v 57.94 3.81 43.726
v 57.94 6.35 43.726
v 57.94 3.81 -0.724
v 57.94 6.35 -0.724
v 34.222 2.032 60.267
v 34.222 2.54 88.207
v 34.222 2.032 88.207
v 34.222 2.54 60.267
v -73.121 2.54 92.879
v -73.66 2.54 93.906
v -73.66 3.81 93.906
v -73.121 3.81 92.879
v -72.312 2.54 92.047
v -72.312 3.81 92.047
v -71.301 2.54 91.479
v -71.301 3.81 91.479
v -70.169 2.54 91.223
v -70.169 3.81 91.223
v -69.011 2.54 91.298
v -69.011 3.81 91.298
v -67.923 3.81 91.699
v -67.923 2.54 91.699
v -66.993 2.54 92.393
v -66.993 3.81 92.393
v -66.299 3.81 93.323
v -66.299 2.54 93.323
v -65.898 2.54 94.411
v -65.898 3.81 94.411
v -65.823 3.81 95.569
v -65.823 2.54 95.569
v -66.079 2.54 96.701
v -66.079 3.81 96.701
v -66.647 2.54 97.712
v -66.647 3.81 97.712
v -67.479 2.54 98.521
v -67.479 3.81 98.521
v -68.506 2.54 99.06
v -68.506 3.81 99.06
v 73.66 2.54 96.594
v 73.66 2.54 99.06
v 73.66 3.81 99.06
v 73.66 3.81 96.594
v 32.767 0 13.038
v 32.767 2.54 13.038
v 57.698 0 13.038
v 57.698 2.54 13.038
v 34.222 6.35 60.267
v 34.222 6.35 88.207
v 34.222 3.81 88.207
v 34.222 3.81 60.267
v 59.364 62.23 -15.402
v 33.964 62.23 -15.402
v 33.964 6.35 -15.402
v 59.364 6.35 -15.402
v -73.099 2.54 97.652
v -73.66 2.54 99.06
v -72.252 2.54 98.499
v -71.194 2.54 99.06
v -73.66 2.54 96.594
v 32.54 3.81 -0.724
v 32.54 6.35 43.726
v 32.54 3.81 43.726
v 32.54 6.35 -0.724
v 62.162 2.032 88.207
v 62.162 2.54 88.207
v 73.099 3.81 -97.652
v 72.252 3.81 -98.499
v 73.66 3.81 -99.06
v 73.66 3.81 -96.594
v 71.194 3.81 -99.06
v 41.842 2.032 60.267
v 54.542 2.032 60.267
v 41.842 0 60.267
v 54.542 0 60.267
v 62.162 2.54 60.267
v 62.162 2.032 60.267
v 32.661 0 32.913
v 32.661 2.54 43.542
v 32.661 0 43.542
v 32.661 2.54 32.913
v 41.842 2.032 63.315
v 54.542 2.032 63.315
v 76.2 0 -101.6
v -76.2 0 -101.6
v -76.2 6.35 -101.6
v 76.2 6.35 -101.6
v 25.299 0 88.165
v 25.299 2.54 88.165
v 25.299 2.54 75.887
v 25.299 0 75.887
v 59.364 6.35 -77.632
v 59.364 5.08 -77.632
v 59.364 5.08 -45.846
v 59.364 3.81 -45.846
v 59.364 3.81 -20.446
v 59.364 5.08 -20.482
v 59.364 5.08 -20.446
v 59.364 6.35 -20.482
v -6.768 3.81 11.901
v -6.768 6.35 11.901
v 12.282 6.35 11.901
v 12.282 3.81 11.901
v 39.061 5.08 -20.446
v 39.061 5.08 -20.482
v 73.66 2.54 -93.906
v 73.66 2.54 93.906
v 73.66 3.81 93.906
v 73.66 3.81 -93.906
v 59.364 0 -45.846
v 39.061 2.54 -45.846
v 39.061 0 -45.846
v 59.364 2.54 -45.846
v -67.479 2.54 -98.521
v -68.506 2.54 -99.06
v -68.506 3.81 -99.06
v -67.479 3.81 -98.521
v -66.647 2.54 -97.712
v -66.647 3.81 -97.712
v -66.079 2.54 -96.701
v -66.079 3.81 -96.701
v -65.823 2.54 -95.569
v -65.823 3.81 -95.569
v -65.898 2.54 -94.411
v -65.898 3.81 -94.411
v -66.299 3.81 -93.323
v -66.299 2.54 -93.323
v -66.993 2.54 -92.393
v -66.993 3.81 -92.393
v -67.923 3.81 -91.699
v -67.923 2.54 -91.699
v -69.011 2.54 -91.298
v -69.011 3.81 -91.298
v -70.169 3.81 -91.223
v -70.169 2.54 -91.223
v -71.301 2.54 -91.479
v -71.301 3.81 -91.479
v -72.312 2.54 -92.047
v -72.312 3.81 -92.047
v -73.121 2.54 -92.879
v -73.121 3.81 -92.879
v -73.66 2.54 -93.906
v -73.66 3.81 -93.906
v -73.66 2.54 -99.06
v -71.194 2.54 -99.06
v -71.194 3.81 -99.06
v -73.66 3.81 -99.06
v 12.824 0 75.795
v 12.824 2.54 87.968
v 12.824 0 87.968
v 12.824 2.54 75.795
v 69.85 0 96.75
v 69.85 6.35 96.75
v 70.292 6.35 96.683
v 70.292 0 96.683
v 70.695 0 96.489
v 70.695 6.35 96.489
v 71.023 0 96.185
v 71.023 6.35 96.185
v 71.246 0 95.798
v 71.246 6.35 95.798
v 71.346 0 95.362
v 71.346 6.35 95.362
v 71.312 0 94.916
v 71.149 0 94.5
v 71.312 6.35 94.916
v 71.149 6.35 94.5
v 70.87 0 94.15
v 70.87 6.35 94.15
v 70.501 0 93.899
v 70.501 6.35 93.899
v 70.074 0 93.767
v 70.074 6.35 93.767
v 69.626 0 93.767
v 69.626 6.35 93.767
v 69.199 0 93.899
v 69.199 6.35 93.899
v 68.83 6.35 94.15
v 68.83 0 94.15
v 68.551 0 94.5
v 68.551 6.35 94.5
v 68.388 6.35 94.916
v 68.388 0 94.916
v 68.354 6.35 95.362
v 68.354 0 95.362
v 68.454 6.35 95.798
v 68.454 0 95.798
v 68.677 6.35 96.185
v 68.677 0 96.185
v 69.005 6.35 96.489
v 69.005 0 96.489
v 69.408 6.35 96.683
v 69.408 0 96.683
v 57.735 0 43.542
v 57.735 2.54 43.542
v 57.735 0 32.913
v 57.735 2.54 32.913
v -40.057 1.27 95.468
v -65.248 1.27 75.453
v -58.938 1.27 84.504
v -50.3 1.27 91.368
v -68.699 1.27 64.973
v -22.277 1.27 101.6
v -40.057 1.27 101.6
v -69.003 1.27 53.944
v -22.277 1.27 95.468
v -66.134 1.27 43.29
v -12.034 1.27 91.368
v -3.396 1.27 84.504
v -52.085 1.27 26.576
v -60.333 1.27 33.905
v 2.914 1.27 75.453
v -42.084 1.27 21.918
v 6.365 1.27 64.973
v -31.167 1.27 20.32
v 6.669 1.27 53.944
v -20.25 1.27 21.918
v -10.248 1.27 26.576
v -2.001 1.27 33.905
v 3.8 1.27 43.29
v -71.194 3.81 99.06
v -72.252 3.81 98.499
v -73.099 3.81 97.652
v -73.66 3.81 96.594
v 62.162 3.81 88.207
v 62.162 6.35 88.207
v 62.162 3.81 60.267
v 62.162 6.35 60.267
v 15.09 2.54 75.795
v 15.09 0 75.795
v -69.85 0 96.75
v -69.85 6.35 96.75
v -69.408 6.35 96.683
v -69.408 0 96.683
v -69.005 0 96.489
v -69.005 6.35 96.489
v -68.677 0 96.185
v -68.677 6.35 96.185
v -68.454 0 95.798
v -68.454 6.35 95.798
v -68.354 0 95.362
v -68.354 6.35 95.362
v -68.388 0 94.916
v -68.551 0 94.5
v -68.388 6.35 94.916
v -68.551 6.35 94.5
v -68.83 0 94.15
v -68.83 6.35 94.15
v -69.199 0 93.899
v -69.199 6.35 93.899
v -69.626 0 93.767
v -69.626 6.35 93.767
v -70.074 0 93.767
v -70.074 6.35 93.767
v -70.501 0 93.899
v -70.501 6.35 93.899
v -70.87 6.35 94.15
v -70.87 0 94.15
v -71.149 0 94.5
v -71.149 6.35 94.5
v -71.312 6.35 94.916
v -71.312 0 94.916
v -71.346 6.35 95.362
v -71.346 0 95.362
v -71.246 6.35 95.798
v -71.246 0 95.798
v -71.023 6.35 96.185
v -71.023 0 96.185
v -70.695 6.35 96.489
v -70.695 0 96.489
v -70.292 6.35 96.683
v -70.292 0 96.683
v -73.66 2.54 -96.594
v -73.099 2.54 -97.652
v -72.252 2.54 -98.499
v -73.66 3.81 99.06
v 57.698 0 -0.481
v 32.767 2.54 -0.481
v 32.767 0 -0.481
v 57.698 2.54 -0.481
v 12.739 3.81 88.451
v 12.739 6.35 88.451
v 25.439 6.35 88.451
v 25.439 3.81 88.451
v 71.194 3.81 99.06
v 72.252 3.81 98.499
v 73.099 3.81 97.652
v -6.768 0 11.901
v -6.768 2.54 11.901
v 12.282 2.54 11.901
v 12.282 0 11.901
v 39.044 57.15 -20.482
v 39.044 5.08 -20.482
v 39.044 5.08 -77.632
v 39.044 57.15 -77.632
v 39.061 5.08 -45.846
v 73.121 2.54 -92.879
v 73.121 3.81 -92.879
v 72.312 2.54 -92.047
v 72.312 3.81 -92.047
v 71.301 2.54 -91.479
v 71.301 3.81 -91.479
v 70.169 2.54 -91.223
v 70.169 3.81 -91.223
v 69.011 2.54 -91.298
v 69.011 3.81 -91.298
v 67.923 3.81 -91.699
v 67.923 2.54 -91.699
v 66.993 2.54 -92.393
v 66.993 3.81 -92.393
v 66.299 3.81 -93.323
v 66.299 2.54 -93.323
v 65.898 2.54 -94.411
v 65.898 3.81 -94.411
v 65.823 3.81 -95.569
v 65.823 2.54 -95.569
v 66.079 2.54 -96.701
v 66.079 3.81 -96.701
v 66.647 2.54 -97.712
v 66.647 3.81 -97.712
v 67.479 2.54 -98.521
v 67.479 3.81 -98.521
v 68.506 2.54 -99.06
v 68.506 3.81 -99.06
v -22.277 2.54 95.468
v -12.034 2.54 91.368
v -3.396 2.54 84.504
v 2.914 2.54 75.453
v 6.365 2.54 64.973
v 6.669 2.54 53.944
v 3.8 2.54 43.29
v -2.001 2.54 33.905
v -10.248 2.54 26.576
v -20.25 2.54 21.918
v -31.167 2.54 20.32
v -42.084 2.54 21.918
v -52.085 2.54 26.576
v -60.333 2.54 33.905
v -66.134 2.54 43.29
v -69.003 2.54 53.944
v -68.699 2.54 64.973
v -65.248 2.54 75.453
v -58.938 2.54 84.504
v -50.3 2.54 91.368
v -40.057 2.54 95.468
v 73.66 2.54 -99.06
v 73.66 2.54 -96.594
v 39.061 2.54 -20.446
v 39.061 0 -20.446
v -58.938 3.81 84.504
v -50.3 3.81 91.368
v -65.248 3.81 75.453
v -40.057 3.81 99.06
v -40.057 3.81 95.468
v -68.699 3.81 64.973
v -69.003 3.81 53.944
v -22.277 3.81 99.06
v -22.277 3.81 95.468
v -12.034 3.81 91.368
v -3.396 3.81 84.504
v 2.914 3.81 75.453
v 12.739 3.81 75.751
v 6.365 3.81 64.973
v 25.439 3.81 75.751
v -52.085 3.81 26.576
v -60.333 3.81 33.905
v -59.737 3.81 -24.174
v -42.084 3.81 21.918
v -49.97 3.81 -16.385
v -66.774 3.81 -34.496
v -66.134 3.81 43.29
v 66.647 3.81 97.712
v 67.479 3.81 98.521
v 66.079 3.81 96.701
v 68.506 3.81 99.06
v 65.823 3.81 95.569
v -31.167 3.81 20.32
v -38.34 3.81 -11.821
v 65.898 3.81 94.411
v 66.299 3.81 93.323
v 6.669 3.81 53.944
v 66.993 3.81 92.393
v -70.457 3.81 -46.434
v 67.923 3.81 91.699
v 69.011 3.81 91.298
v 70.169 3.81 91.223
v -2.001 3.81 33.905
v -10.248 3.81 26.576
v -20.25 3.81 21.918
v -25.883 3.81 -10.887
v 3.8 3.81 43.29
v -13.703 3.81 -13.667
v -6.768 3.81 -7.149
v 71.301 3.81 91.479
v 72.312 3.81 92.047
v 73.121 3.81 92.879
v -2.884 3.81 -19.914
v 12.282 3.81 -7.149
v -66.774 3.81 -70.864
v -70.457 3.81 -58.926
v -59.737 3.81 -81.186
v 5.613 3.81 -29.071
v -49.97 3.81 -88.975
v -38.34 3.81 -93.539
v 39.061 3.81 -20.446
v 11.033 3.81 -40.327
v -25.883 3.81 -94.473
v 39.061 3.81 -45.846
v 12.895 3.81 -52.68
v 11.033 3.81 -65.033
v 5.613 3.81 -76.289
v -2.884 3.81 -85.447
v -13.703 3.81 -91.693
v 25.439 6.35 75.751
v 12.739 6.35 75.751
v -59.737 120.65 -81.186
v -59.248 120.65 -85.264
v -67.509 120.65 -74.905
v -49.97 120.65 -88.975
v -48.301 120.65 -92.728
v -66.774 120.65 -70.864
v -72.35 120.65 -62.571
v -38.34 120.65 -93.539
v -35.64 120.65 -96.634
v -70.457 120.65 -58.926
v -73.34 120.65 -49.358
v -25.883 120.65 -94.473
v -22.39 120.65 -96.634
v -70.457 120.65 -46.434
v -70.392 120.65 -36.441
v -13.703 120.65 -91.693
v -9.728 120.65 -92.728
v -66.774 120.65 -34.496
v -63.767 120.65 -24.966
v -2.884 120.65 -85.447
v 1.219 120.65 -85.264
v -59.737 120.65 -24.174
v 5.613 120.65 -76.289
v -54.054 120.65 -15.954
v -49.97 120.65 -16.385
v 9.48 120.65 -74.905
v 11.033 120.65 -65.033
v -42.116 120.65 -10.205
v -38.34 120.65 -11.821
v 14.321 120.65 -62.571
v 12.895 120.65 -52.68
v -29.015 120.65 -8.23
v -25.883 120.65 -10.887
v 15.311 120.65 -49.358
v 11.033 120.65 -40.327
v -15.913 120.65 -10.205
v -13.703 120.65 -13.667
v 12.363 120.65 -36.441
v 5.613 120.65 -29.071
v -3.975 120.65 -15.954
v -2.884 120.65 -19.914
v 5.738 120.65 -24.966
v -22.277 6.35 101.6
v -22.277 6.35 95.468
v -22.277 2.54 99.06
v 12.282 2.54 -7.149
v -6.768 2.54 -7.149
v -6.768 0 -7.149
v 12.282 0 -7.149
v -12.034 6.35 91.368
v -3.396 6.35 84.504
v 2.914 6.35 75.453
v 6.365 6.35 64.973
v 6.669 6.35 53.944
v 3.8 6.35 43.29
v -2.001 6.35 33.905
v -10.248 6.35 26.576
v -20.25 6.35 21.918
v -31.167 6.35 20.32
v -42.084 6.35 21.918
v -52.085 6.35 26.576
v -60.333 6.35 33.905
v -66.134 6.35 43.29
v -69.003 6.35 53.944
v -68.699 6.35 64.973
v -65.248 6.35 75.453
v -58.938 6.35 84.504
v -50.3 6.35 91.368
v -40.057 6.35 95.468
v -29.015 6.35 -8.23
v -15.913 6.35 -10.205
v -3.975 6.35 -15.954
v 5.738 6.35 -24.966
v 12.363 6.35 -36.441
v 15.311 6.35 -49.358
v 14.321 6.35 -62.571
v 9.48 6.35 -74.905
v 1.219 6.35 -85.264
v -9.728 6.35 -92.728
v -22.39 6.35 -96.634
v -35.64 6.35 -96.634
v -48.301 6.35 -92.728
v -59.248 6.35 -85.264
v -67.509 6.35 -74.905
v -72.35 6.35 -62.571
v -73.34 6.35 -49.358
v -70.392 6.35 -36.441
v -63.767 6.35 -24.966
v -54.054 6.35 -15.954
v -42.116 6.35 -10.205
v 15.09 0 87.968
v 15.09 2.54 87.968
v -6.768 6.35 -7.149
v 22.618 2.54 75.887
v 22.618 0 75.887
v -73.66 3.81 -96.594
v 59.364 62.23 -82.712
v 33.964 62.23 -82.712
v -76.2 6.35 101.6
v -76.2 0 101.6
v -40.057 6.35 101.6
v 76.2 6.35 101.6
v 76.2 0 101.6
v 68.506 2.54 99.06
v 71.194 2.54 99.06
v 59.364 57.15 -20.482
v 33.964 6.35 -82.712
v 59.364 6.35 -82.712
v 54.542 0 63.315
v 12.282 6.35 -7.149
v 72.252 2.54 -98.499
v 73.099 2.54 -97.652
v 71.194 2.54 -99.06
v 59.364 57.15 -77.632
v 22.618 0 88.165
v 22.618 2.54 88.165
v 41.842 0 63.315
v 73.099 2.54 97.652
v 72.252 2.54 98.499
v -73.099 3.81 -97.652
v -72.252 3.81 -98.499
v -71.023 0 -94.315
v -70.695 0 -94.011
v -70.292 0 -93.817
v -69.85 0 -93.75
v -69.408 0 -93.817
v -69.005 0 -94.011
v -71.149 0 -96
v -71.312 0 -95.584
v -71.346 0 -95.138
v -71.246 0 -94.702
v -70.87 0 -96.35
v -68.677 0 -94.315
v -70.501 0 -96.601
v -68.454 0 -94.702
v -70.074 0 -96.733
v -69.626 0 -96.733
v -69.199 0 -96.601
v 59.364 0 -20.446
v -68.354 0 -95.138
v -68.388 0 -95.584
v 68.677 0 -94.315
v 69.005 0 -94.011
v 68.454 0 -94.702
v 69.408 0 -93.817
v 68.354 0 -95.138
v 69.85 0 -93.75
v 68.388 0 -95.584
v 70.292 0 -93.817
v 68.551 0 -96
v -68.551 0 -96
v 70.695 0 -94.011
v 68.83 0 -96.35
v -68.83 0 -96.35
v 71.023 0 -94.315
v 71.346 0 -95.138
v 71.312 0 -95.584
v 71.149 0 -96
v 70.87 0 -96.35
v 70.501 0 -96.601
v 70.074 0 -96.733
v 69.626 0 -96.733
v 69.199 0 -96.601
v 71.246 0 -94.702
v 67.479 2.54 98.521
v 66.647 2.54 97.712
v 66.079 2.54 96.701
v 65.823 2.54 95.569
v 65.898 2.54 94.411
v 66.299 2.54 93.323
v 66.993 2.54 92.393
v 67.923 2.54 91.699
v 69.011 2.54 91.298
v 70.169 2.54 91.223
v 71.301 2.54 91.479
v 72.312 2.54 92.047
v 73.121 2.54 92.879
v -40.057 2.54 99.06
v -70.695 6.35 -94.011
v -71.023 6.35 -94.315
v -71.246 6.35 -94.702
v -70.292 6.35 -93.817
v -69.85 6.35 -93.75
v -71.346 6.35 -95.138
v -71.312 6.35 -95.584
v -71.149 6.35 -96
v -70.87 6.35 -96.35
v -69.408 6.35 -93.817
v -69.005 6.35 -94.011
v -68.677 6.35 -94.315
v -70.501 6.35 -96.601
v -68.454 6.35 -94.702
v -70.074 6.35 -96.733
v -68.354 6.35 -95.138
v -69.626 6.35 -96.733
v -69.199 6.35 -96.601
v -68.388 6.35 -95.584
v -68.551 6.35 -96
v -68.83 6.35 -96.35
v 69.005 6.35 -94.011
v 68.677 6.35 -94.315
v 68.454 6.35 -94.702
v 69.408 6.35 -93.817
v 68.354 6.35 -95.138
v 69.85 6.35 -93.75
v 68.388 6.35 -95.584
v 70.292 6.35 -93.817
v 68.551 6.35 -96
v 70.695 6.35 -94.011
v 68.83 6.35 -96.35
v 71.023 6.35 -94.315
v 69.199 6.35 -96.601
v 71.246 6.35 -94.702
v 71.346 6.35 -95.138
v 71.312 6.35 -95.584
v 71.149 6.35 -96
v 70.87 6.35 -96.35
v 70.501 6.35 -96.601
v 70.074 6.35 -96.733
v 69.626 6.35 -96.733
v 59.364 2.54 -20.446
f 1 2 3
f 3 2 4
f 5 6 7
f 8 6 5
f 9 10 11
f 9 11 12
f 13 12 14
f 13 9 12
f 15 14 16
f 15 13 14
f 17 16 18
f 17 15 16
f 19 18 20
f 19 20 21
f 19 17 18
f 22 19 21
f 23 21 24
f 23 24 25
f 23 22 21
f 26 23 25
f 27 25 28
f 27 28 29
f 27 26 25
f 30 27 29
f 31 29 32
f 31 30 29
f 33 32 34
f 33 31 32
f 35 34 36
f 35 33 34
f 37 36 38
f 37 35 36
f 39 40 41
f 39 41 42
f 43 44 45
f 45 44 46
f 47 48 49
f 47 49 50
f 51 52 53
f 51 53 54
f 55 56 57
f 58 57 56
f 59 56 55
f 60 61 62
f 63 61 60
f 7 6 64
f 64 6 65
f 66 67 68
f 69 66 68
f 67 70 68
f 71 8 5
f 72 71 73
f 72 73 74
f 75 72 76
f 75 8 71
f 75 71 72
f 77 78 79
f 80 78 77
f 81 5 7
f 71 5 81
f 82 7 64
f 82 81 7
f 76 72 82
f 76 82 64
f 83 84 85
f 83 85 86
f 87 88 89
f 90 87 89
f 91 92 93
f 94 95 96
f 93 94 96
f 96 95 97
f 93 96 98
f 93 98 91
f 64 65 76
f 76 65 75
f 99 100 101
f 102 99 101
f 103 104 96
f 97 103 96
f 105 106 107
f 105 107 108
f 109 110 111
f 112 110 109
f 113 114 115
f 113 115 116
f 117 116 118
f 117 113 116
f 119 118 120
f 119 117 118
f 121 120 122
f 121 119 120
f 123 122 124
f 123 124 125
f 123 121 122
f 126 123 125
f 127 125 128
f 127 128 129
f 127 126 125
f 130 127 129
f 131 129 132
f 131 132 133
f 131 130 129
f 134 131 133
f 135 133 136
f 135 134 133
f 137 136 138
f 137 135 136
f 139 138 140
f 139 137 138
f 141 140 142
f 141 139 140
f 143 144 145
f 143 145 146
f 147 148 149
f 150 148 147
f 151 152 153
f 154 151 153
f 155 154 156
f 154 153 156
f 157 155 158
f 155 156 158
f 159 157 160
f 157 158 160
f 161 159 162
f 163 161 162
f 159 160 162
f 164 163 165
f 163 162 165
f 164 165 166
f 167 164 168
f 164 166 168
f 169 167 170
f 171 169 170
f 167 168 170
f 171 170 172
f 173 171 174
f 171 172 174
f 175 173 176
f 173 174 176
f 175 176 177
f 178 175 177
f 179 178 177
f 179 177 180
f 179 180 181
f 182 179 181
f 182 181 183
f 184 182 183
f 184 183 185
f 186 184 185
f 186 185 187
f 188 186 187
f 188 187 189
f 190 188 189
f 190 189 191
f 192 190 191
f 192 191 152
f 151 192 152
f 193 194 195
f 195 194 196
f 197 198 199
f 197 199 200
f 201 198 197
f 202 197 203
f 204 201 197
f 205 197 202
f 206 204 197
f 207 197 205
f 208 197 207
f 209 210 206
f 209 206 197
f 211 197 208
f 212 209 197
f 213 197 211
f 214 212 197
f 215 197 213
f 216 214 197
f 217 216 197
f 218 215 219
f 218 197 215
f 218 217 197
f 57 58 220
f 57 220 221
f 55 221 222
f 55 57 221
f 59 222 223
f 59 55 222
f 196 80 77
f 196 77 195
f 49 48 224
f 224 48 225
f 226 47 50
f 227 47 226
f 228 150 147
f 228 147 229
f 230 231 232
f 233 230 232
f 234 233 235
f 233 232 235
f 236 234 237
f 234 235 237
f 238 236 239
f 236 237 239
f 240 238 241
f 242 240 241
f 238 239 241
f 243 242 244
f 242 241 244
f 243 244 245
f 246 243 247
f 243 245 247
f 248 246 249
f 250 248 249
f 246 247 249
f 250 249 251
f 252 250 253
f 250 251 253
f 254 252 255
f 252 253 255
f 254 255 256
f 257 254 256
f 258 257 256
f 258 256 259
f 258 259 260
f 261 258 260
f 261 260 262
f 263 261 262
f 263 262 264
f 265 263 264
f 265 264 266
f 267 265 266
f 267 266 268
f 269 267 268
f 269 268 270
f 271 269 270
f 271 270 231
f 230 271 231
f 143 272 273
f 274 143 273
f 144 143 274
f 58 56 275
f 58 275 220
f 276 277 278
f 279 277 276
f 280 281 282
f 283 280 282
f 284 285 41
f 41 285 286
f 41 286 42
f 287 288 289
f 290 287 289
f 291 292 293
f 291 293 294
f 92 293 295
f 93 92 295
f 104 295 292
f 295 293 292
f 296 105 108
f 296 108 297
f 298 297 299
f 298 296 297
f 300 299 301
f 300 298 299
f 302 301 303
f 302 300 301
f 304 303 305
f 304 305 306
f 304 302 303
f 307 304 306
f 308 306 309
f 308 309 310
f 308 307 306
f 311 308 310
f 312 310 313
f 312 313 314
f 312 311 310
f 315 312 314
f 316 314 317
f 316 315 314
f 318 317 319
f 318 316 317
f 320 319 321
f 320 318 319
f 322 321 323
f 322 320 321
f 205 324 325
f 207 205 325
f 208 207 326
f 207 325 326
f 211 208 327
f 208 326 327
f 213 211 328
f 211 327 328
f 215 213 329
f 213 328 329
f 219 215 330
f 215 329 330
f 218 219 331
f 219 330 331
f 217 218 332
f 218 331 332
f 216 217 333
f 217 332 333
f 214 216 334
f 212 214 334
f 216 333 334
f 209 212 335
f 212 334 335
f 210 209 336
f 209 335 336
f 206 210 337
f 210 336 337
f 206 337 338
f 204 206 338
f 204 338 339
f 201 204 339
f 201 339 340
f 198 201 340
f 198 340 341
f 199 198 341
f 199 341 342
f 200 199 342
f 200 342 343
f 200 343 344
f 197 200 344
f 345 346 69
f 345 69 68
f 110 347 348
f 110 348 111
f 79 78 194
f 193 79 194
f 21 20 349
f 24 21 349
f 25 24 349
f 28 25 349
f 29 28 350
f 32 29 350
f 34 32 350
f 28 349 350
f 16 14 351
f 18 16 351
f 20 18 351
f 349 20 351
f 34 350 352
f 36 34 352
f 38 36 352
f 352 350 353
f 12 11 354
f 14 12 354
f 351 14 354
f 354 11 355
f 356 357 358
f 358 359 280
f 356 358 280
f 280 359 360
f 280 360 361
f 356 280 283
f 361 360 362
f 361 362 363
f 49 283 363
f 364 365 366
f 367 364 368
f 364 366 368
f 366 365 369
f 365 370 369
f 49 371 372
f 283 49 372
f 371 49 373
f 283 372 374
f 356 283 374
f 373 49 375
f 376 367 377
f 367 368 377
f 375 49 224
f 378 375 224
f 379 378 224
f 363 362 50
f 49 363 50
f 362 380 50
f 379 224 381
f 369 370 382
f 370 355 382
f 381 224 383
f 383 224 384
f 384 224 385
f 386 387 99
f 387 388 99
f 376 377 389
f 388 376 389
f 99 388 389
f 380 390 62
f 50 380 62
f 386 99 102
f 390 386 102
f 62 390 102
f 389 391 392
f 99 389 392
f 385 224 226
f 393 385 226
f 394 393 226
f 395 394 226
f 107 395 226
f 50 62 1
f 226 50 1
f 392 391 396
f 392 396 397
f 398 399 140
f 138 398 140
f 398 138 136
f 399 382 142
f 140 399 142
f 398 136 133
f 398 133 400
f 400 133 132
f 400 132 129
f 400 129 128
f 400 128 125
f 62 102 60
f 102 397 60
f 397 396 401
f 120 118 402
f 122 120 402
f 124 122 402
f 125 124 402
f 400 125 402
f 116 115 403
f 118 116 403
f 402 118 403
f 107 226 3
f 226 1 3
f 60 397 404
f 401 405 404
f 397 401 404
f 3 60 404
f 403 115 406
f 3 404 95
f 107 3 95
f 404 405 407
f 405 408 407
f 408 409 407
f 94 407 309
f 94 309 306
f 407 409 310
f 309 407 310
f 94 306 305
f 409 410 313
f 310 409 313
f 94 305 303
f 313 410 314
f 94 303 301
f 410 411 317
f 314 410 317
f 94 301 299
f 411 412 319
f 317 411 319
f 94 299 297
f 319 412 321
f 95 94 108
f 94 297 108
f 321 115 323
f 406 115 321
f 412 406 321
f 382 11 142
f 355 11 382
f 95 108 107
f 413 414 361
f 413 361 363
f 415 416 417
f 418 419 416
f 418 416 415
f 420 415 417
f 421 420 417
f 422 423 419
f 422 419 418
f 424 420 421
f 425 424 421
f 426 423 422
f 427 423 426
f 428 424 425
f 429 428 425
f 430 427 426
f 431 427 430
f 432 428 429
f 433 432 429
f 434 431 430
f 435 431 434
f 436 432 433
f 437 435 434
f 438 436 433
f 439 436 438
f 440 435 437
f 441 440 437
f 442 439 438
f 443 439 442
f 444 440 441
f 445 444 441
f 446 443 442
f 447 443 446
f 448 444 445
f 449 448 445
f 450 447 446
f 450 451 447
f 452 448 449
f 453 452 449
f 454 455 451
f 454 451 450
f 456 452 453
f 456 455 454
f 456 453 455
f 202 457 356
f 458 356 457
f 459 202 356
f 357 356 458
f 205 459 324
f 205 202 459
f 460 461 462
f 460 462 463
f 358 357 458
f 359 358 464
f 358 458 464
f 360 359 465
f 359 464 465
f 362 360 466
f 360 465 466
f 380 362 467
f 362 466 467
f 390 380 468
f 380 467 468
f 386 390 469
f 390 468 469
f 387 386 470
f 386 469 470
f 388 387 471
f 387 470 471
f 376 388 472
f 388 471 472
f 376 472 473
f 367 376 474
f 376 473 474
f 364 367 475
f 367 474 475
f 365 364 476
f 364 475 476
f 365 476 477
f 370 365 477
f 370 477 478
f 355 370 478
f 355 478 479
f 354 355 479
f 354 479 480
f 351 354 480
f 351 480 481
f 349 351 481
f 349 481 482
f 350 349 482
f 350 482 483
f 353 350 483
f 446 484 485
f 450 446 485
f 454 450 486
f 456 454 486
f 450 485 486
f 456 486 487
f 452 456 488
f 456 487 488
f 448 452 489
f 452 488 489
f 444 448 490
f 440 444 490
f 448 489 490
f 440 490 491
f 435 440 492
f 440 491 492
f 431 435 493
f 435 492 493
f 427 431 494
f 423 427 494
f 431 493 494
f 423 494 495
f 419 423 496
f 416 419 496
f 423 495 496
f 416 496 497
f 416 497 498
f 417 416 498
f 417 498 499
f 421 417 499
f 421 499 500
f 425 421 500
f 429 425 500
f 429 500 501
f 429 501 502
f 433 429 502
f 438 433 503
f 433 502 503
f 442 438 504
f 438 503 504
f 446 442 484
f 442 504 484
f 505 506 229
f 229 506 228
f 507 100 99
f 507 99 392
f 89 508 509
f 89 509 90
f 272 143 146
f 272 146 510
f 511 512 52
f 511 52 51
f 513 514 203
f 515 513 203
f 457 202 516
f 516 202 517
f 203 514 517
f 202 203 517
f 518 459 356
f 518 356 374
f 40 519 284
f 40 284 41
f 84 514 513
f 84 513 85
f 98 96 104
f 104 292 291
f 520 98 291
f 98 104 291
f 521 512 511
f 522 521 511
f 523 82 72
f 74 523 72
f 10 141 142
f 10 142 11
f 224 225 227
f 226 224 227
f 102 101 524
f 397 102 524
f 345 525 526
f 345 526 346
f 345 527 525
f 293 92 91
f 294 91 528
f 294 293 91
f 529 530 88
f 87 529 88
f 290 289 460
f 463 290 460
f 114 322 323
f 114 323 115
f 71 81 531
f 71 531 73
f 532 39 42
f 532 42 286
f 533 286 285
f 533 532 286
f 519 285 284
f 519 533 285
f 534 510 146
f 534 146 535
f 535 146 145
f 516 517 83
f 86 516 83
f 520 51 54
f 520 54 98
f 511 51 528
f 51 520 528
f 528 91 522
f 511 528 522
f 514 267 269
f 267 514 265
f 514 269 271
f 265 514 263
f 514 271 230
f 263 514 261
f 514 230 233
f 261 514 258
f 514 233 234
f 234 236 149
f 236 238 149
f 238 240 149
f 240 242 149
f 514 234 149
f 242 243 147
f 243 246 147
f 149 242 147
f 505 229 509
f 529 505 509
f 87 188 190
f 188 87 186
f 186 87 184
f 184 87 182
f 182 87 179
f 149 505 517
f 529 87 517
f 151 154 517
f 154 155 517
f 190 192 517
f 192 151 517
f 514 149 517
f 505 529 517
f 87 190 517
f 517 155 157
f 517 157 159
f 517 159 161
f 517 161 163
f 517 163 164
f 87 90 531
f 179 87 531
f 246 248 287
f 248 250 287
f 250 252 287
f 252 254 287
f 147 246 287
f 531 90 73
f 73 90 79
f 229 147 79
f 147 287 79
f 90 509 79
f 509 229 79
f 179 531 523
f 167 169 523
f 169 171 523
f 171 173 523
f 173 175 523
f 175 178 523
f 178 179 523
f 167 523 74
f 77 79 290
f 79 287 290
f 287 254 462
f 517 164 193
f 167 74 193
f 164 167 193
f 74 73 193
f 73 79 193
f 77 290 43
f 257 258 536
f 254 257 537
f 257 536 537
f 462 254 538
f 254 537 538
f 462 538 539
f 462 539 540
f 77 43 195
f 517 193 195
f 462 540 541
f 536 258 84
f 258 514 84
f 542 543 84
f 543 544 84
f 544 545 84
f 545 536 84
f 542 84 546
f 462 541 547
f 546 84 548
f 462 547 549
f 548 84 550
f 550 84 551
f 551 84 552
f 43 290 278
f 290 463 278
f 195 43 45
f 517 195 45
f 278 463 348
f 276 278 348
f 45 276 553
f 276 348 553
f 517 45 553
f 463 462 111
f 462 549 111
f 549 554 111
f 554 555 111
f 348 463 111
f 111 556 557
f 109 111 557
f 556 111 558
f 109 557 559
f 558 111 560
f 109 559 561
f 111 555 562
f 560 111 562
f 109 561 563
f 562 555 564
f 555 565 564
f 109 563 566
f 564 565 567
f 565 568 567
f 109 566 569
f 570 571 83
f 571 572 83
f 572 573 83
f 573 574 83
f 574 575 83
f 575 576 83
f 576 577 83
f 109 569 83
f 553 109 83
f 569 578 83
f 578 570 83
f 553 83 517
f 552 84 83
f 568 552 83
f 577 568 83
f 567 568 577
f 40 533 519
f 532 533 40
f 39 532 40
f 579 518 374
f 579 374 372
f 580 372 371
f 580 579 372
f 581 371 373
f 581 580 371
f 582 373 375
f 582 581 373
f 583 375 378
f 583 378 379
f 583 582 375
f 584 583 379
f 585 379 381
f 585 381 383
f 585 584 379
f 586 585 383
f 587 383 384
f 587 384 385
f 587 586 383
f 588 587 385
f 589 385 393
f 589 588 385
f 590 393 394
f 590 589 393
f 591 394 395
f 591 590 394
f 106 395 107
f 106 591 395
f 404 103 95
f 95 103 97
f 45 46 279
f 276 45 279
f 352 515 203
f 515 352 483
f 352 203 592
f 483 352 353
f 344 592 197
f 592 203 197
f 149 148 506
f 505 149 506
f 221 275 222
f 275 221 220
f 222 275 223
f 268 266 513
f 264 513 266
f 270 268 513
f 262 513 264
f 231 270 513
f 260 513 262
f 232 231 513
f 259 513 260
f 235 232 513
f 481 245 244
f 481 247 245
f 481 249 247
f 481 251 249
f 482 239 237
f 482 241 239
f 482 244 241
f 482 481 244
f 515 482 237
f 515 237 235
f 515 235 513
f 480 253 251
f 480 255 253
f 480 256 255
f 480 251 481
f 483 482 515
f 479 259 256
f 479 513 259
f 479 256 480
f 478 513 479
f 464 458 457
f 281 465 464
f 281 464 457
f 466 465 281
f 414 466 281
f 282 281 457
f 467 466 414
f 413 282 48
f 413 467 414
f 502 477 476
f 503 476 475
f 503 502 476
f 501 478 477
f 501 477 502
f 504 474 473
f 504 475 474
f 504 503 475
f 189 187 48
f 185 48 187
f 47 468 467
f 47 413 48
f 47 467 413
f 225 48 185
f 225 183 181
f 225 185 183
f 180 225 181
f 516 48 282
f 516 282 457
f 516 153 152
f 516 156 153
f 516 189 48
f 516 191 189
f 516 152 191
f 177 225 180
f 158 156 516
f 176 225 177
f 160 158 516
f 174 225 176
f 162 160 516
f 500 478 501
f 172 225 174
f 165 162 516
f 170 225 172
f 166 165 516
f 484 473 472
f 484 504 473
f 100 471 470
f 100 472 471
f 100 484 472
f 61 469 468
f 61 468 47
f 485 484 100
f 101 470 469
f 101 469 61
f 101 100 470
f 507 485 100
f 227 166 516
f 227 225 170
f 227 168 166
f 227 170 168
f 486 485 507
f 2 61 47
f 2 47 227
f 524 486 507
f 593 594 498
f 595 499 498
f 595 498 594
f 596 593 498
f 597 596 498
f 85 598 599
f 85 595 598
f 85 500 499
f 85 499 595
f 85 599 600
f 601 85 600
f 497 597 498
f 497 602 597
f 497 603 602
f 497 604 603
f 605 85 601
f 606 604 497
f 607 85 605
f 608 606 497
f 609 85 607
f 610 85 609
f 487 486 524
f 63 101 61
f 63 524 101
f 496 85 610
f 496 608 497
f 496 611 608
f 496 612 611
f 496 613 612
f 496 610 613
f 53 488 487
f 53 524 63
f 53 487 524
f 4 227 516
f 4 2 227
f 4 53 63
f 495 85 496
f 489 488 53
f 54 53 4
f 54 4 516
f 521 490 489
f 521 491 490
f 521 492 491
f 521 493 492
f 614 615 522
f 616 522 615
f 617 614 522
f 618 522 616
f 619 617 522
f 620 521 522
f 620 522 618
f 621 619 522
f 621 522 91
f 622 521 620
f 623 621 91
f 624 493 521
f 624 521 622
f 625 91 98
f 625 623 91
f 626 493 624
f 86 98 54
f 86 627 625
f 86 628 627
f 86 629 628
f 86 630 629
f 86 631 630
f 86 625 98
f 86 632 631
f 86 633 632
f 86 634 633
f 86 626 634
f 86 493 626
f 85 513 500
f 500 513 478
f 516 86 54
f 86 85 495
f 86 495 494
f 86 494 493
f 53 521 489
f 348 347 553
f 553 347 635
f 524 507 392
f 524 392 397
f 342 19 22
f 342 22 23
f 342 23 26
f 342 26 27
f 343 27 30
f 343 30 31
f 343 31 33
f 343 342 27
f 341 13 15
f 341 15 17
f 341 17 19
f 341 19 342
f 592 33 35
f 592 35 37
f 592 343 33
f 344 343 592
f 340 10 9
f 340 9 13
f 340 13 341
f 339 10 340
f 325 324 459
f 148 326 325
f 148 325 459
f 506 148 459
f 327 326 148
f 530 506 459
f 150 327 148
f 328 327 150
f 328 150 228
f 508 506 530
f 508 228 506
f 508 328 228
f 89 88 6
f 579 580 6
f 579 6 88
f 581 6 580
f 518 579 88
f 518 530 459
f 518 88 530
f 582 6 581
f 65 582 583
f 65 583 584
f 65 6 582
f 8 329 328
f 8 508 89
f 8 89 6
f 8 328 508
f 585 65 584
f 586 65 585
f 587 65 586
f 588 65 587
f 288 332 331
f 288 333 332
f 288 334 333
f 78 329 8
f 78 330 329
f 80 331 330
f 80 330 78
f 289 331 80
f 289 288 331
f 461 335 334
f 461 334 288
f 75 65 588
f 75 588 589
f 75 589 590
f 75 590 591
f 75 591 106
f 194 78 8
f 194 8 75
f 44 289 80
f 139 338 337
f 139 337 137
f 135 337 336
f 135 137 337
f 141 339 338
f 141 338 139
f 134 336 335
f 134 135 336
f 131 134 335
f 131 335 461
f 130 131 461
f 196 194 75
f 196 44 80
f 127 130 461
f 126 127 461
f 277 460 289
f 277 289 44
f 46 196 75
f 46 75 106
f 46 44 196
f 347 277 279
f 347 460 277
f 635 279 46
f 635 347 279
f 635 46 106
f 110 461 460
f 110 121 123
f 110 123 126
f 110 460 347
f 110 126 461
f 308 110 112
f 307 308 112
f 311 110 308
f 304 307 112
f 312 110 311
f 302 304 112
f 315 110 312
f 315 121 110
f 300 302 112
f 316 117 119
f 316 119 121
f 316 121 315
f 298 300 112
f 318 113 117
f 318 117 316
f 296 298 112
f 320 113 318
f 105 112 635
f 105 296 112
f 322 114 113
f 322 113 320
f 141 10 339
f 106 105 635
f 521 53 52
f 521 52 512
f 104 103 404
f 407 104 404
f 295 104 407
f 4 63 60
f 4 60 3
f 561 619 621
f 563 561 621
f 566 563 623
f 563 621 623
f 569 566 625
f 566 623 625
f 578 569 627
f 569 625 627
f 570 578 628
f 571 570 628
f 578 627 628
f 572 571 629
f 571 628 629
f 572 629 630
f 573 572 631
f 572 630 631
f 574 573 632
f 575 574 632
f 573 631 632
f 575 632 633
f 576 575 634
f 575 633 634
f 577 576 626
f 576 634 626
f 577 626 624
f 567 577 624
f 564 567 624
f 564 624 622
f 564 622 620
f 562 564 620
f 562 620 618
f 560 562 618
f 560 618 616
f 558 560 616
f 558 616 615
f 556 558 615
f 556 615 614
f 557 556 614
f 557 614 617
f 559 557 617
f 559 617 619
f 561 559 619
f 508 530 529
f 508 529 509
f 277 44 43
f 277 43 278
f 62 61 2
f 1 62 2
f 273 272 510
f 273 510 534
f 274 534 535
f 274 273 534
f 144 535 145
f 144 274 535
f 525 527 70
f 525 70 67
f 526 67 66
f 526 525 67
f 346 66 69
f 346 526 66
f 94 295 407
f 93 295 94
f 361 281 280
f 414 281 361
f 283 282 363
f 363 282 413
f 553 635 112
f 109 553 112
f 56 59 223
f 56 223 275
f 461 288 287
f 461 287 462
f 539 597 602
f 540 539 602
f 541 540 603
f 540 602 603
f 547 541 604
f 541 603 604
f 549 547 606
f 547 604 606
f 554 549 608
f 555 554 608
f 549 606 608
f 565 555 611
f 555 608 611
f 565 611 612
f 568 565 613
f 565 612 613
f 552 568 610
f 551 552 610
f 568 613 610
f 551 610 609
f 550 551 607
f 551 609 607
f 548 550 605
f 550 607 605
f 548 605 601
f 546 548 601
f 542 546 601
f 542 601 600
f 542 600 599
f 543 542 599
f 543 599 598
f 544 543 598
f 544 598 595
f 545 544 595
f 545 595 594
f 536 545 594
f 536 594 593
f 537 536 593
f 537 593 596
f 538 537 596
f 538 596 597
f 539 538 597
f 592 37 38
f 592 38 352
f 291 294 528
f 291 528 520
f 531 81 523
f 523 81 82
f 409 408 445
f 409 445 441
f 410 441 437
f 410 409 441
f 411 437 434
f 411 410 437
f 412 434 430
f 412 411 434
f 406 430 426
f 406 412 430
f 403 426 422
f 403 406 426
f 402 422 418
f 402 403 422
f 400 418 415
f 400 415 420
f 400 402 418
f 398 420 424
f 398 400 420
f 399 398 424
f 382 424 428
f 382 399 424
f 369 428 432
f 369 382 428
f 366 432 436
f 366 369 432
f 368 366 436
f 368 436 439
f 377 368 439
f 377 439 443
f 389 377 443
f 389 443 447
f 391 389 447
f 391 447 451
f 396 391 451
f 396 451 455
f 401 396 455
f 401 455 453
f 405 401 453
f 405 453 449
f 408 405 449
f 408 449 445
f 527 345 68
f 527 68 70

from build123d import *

# Parameters (mm, degrees)
SKETCH1_W           = 152.4
SKETCH1_H           = 203.2
BOSS_EXTRUDE2_DEPTH = 6.35
SKETCH2_R           = 1.5
CUT_EXTRUDE1_DEPTH  = 128.158650905
SKETCH3_R           = 1.5
CUT_EXTRUDE2_DEPTH  = 128.158650905
SKETCH4_R           = 1.5
CUT_EXTRUDE3_DEPTH  = 128.158650905
SKETCH5_R           = 44.45
BOSS_EXTRUDE3_DEPTH = 114.3
SHELL1_START        = 2.54
SHELL1_OUTLINE_R    = 41.91
SHELL1_DEPTH        = 118.11
SHELL1_2_OUTLINE_R  = 41.91
SHELL1_2_DEPTH      = 1.27
SKETCH6_R           = 38.1
CUT_EXTRUDE4_DEPTH  = 5.08
SKETCH7_W           = 17.78
SKETCH7_H           = 18.673076246
CUT_EXTRUDE5_DEPTH  = 5.08
SKETCH8_W           = 19.05
SKETCH8_H           = 19.05
CUT_EXTRUDE6_DEPTH  = 171.861025398
SKETCH9_W           = 27.94
SKETCH9_H           = 27.94
CUT_EXTRUDE7_DEPTH  = 4.318
SKETCH10_W          = 12.7
SKETCH10_H          = 3.048
CUT_EXTRUDE9_DEPTH  = 174.779256311
SKETCH12_W          = 25.4
SKETCH12_H          = 67.31
BOSS_EXTRUDE5_DEPTH = 55.88
SHELL3_START        = 39.044015943
SHELL3_OUTLINE_W    = 52.07
SHELL3_OUTLINE_H    = 57.15
SHELL3_DEPTH        = 20.32
SKETCH13_W          = 20.303180985
SKETCH13_H          = 25.4
CUT_EXTRUDE10_DEPTH = 55.88
SKETCH17_W          = 25.4
SKETCH17_H          = 44.45
CUT_EXTRUDE11_DEPTH = 3.048
SKETCH18_W          = 24.931380967
SKETCH18_H          = 13.519409137
CUT_EXTRUDE12_DEPTH = 10.668
SKETCH19_W          = 25.074639176
SKETCH19_H          = 10.629198189
CUT_EXTRUDE13_DEPTH = 10.668
SKETCH20_W          = 12.7
SKETCH20_H          = 12.7
CUT_EXTRUDE14_DEPTH = 3.048
SKETCH22_W          = 2.266473324
SKETCH22_H          = 12.172894029
CUT_EXTRUDE15_DEPTH = 5.08
SKETCH23_W          = 2.681145579
SKETCH23_H          = 12.278390502
CUT_EXTRUDE16_DEPTH = 5.08


# Read off the part's stored shape, not the designer's step: Shell1, Shell3
with BuildPart() as part:
    # Sketch1 → Boss-Extrude2 (new body)
    with BuildSketch(Plane(origin=(0, 0, 0), x_dir=(1, 0, 0), z_dir=(0, 1, 0))):
        Rectangle(SKETCH1_W, SKETCH1_H)
    extrude(amount=BOSS_EXTRUDE2_DEPTH)

    # Sketch2 → Cut-Extrude1 (cut, through all)
    with BuildSketch(Plane(origin=(0, 6.35, 0), x_dir=(1, 0, 0), z_dir=(0, 1, 0))):
        with Locations(Location((-69.85, 95.25, 0), (0, 0, 270))):
            Circle(SKETCH2_R)
    extrude(amount=-CUT_EXTRUDE1_DEPTH, mode=Mode.SUBTRACT)

    # Sketch3 → Cut-Extrude2 (cut, through all)
    with BuildSketch(Plane(origin=(0, 6.35, 0), x_dir=(1, 0, 0), z_dir=(0, 1, 0))):
        with Locations(Location((69.85, 95.25, 0), (0, 0, 270))):
            Circle(SKETCH3_R)
    extrude(amount=-CUT_EXTRUDE2_DEPTH, mode=Mode.SUBTRACT)

    # Sketch4 → Cut-Extrude3 (cut, through all)
    with BuildSketch(Plane(origin=(0, 6.35, 0), x_dir=(1, 0, 0), z_dir=(0, 1, 0))):
        with Locations(Location((69.85, -95.25, 0), (0, 0, 270))):
            Circle(SKETCH4_R)
        with Locations(Location((-69.85, -95.25, 0), (0, 0, 270))):
            Circle(SKETCH4_R)
    extrude(amount=-CUT_EXTRUDE3_DEPTH, mode=Mode.SUBTRACT)

    # Sketch5 → Boss-Extrude3 (add)
    with BuildSketch(Plane(origin=(0, 6.35, 0), x_dir=(1, 0, 0), z_dir=(0, 1, 0))):
        with Locations(Location((-29.014615541, 52.680103604, 0), (0, 0, 270))):
            Circle(SKETCH5_R)
    extrude(amount=BOSS_EXTRUDE3_DEPTH)

    # Shell1 outline → Shell1 (cut)
    with BuildSketch(Plane(origin=(0, 0, 0), x_dir=(1, 0, 0), z_dir=(0, 1, 0)).offset(SHELL1_START)):
        with Locations((-29.014615541, 52.680103604)):
            Circle(SHELL1_OUTLINE_R)
    extrude(amount=SHELL1_DEPTH, mode=Mode.SUBTRACT)

    # Shell1 2 outline → Shell1 2 (cut)
    # profile 1 of 5: a face of its own
    with BuildSketch(Plane(origin=(0, 0, 0), x_dir=(1, 0, 0), z_dir=(0, 1, 0)).offset(SHELL1_START)):
        with BuildLine():
            ThreePointArc((-68.506311048, 99.06), (-66.993288604, 92.393288604), (-73.66, 93.906311048))
            Line((-73.66, 93.906311048), (-73.66, -93.906311048))
            ThreePointArc((-73.66, -93.906311048), (-66.993288604, -92.393288604), (-68.506311048, -99.06))
            Line((-68.506311048, -99.06), (68.506311048, -99.06))
            ThreePointArc((68.506311048, -99.06), (66.993288604, -92.393288604), (73.66, -93.906311048))
            Line((73.66, -93.906311048), (73.66, 93.906311048))
            ThreePointArc((73.66, 93.906311048), (66.993288604, 92.393288604), (68.506311048, 99.06))
            Line((68.506311048, 99.06), (-68.506311048, 99.06))
        make_face()
        with Locations((-29.014615541, 52.680103604)):
            Circle(SHELL1_2_OUTLINE_R, mode=Mode.SUBTRACT)
    # profile 2 of 5: a face of its own
    with BuildSketch(Plane(origin=(0, 0, 0), x_dir=(1, 0, 0), z_dir=(0, 1, 0)).offset(SHELL1_START)):
        with BuildLine():
            ThreePointArc((-73.66, 96.593688952), (-72.706711396, 98.106711396), (-71.193688952, 99.06))
            Line((-71.193688952, 99.06), (-73.66, 99.06))
            Line((-73.66, 99.06), (-73.66, 96.593688952))
        make_face()
    # profile 3 of 5: a face of its own
    with BuildSketch(Plane(origin=(0, 0, 0), x_dir=(1, 0, 0), z_dir=(0, 1, 0)).offset(SHELL1_START)):
        with BuildLine():
            Line((73.66, 99.06), (71.193688952, 99.06))
            ThreePointArc((71.193688952, 99.06), (72.706711396, 98.106711396), (73.66, 96.593688952))
            Line((73.66, 96.593688952), (73.66, 99.06))
        make_face()
    # profile 4 of 5: a face of its own
    with BuildSketch(Plane(origin=(0, 0, 0), x_dir=(1, 0, 0), z_dir=(0, 1, 0)).offset(SHELL1_START)):
        with BuildLine():
            Line((73.66, -99.06), (73.66, -96.593688952))
            ThreePointArc((73.66, -96.593688952), (72.706711396, -98.106711396), (71.193688952, -99.06))
            Line((71.193688952, -99.06), (73.66, -99.06))
        make_face()
    # profile 5 of 5: a face of its own
    with BuildSketch(Plane(origin=(0, 0, 0), x_dir=(1, 0, 0), z_dir=(0, 1, 0)).offset(SHELL1_START)):
        with BuildLine():
            ThreePointArc((-71.193688952, -99.06), (-72.706711396, -98.106711396), (-73.66, -96.593688952))
            Line((-73.66, -96.593688952), (-73.66, -99.06))
            Line((-73.66, -99.06), (-71.193688952, -99.06))
        make_face()
    extrude(amount=SHELL1_2_DEPTH, mode=Mode.SUBTRACT)

    # Sketch6 → Cut-Extrude4 (cut)
    with BuildSketch(Plane(origin=(0, 6.35, 0), x_dir=(1, 0, 0), z_dir=(0, 1, 0))):
        with Locations(Location((-31.166979336, -58.42, 0), (0, 0, 270))):
            Circle(SKETCH6_R)
    extrude(amount=-CUT_EXTRUDE4_DEPTH, mode=Mode.SUBTRACT)

    # Sketch7 → Cut-Extrude5 (cut)
    with BuildSketch(Plane(origin=(0, 1.27, 0), x_dir=(1, 0, 0), z_dir=(0, 1, 0))):
        with Locations((-31.166979336, -96.52)):
            Rectangle(SKETCH7_W, SKETCH7_H)
    extrude(amount=CUT_EXTRUDE5_DEPTH, mode=Mode.SUBTRACT)

    # Sketch8 → Cut-Extrude6 (cut, through all)
    with BuildSketch(Plane(origin=(0, 6.35, 0), x_dir=(1, 0, 0), z_dir=(0, 1, 0))):
        with Locations((2.757472123, -2.376350246)):
            Rectangle(SKETCH8_W, SKETCH8_H)
    extrude(amount=-CUT_EXTRUDE6_DEPTH, mode=Mode.SUBTRACT)

    # Sketch9 → Cut-Extrude7 (cut)
    with BuildSketch(Plane(origin=(0, 6.35, 0), x_dir=(1, 0, 0), z_dir=(0, 1, 0))):
        with Locations((48.191649932, -74.237208762)):
            Rectangle(SKETCH9_W, SKETCH9_H)
    extrude(amount=-CUT_EXTRUDE7_DEPTH, mode=Mode.SUBTRACT)

    # Sketch10 → Cut-Extrude9 (cut, through all)
    with BuildSketch(Plane(origin=(0, 2.032, 0), x_dir=(1, 0, 0), z_dir=(0, 1, 0))):
        with Locations((48.191649932, -61.791208762)):
            Rectangle(SKETCH10_W, SKETCH10_H)
    extrude(amount=-CUT_EXTRUDE9_DEPTH, mode=Mode.SUBTRACT)

    # Sketch12 → Boss-Extrude5 (add)
    with BuildSketch(Plane(origin=(0, 6.35, 0), x_dir=(1, 0, 0), z_dir=(0, 1, 0))):
        with Locations((46.664015943, 49.057368238)):
            Rectangle(SKETCH12_W, SKETCH12_H)
    extrude(amount=BOSS_EXTRUDE5_DEPTH)

    # Shell3 outline → Shell3 (cut)
    with BuildSketch(Plane.YZ.offset(SHELL3_START)):
        with Locations((31.115, -49.057368238)):
            Rectangle(SHELL3_OUTLINE_W, SHELL3_OUTLINE_H)
    extrude(amount=SHELL3_DEPTH, mode=Mode.SUBTRACT)

    # Sketch13 → Cut-Extrude10 (cut)
    with BuildSketch(Plane(origin=(0, 5.08, 0), x_dir=(1, 0, 0), z_dir=(0, 1, 0))):
        with Locations((49.212425451, 33.146004513)):
            Rectangle(SKETCH13_W, SKETCH13_H)
    extrude(amount=-CUT_EXTRUDE10_DEPTH, mode=Mode.SUBTRACT)

    # Sketch17 → Cut-Extrude11 (cut)
    with BuildSketch(Plane(origin=(0, 6.35, 0), x_dir=(1, 0, 0), z_dir=(0, 1, 0))):
        with Locations((45.24021519, -21.500928879)):
            Rectangle(SKETCH17_W, SKETCH17_H)
    extrude(amount=-CUT_EXTRUDE11_DEPTH, mode=Mode.SUBTRACT)

    # Sketch18 → Cut-Extrude12 (cut)
    with BuildSketch(Plane(origin=(0, 2.54, 0), x_dir=(1, 0, 0), z_dir=(0, 1, 0))):
        with Locations((45.232741318, -6.278596744)):
            Rectangle(SKETCH18_W, SKETCH18_H)
    extrude(amount=-CUT_EXTRUDE12_DEPTH, mode=Mode.SUBTRACT)

    # Sketch19 → Cut-Extrude13 (cut)
    with BuildSketch(Plane(origin=(0, 2.54, 0), x_dir=(1, 0, 0), z_dir=(0, 1, 0))):
        with Locations((45.198109279, -38.227166647)):
            Rectangle(SKETCH19_W, SKETCH19_H)
    extrude(amount=-CUT_EXTRUDE13_DEPTH, mode=Mode.SUBTRACT)

    # Sketch20 → Cut-Extrude14 (cut)
    with BuildSketch(Plane(origin=(0, 6.35, 0), x_dir=(1, 0, 0), z_dir=(0, 1, 0))):
        with Locations((19.089329665, -82.100593314)):
            Rectangle(SKETCH20_W, SKETCH20_H)
    extrude(amount=-CUT_EXTRUDE14_DEPTH, mode=Mode.SUBTRACT)

    # Sketch22 → Cut-Extrude15 (cut)
    with BuildSketch(Plane(origin=(0, 2.54, 0), x_dir=(1, 0, 0), z_dir=(0, 1, 0))):
        with Locations((13.956818217, -81.881158104)):
            Rectangle(SKETCH22_W, SKETCH22_H)
    extrude(amount=-CUT_EXTRUDE15_DEPTH, mode=Mode.SUBTRACT)

    # Sketch23 → Cut-Extrude16 (cut)
    with BuildSketch(Plane(origin=(0, 2.54, 0), x_dir=(1, 0, 0), z_dir=(0, 1, 0))):
        with Locations((23.958869164, -82.026056303)):
            Rectangle(SKETCH23_W, SKETCH23_H)
    extrude(amount=-CUT_EXTRUDE16_DEPTH, mode=Mode.SUBTRACT)


solid = part.part
